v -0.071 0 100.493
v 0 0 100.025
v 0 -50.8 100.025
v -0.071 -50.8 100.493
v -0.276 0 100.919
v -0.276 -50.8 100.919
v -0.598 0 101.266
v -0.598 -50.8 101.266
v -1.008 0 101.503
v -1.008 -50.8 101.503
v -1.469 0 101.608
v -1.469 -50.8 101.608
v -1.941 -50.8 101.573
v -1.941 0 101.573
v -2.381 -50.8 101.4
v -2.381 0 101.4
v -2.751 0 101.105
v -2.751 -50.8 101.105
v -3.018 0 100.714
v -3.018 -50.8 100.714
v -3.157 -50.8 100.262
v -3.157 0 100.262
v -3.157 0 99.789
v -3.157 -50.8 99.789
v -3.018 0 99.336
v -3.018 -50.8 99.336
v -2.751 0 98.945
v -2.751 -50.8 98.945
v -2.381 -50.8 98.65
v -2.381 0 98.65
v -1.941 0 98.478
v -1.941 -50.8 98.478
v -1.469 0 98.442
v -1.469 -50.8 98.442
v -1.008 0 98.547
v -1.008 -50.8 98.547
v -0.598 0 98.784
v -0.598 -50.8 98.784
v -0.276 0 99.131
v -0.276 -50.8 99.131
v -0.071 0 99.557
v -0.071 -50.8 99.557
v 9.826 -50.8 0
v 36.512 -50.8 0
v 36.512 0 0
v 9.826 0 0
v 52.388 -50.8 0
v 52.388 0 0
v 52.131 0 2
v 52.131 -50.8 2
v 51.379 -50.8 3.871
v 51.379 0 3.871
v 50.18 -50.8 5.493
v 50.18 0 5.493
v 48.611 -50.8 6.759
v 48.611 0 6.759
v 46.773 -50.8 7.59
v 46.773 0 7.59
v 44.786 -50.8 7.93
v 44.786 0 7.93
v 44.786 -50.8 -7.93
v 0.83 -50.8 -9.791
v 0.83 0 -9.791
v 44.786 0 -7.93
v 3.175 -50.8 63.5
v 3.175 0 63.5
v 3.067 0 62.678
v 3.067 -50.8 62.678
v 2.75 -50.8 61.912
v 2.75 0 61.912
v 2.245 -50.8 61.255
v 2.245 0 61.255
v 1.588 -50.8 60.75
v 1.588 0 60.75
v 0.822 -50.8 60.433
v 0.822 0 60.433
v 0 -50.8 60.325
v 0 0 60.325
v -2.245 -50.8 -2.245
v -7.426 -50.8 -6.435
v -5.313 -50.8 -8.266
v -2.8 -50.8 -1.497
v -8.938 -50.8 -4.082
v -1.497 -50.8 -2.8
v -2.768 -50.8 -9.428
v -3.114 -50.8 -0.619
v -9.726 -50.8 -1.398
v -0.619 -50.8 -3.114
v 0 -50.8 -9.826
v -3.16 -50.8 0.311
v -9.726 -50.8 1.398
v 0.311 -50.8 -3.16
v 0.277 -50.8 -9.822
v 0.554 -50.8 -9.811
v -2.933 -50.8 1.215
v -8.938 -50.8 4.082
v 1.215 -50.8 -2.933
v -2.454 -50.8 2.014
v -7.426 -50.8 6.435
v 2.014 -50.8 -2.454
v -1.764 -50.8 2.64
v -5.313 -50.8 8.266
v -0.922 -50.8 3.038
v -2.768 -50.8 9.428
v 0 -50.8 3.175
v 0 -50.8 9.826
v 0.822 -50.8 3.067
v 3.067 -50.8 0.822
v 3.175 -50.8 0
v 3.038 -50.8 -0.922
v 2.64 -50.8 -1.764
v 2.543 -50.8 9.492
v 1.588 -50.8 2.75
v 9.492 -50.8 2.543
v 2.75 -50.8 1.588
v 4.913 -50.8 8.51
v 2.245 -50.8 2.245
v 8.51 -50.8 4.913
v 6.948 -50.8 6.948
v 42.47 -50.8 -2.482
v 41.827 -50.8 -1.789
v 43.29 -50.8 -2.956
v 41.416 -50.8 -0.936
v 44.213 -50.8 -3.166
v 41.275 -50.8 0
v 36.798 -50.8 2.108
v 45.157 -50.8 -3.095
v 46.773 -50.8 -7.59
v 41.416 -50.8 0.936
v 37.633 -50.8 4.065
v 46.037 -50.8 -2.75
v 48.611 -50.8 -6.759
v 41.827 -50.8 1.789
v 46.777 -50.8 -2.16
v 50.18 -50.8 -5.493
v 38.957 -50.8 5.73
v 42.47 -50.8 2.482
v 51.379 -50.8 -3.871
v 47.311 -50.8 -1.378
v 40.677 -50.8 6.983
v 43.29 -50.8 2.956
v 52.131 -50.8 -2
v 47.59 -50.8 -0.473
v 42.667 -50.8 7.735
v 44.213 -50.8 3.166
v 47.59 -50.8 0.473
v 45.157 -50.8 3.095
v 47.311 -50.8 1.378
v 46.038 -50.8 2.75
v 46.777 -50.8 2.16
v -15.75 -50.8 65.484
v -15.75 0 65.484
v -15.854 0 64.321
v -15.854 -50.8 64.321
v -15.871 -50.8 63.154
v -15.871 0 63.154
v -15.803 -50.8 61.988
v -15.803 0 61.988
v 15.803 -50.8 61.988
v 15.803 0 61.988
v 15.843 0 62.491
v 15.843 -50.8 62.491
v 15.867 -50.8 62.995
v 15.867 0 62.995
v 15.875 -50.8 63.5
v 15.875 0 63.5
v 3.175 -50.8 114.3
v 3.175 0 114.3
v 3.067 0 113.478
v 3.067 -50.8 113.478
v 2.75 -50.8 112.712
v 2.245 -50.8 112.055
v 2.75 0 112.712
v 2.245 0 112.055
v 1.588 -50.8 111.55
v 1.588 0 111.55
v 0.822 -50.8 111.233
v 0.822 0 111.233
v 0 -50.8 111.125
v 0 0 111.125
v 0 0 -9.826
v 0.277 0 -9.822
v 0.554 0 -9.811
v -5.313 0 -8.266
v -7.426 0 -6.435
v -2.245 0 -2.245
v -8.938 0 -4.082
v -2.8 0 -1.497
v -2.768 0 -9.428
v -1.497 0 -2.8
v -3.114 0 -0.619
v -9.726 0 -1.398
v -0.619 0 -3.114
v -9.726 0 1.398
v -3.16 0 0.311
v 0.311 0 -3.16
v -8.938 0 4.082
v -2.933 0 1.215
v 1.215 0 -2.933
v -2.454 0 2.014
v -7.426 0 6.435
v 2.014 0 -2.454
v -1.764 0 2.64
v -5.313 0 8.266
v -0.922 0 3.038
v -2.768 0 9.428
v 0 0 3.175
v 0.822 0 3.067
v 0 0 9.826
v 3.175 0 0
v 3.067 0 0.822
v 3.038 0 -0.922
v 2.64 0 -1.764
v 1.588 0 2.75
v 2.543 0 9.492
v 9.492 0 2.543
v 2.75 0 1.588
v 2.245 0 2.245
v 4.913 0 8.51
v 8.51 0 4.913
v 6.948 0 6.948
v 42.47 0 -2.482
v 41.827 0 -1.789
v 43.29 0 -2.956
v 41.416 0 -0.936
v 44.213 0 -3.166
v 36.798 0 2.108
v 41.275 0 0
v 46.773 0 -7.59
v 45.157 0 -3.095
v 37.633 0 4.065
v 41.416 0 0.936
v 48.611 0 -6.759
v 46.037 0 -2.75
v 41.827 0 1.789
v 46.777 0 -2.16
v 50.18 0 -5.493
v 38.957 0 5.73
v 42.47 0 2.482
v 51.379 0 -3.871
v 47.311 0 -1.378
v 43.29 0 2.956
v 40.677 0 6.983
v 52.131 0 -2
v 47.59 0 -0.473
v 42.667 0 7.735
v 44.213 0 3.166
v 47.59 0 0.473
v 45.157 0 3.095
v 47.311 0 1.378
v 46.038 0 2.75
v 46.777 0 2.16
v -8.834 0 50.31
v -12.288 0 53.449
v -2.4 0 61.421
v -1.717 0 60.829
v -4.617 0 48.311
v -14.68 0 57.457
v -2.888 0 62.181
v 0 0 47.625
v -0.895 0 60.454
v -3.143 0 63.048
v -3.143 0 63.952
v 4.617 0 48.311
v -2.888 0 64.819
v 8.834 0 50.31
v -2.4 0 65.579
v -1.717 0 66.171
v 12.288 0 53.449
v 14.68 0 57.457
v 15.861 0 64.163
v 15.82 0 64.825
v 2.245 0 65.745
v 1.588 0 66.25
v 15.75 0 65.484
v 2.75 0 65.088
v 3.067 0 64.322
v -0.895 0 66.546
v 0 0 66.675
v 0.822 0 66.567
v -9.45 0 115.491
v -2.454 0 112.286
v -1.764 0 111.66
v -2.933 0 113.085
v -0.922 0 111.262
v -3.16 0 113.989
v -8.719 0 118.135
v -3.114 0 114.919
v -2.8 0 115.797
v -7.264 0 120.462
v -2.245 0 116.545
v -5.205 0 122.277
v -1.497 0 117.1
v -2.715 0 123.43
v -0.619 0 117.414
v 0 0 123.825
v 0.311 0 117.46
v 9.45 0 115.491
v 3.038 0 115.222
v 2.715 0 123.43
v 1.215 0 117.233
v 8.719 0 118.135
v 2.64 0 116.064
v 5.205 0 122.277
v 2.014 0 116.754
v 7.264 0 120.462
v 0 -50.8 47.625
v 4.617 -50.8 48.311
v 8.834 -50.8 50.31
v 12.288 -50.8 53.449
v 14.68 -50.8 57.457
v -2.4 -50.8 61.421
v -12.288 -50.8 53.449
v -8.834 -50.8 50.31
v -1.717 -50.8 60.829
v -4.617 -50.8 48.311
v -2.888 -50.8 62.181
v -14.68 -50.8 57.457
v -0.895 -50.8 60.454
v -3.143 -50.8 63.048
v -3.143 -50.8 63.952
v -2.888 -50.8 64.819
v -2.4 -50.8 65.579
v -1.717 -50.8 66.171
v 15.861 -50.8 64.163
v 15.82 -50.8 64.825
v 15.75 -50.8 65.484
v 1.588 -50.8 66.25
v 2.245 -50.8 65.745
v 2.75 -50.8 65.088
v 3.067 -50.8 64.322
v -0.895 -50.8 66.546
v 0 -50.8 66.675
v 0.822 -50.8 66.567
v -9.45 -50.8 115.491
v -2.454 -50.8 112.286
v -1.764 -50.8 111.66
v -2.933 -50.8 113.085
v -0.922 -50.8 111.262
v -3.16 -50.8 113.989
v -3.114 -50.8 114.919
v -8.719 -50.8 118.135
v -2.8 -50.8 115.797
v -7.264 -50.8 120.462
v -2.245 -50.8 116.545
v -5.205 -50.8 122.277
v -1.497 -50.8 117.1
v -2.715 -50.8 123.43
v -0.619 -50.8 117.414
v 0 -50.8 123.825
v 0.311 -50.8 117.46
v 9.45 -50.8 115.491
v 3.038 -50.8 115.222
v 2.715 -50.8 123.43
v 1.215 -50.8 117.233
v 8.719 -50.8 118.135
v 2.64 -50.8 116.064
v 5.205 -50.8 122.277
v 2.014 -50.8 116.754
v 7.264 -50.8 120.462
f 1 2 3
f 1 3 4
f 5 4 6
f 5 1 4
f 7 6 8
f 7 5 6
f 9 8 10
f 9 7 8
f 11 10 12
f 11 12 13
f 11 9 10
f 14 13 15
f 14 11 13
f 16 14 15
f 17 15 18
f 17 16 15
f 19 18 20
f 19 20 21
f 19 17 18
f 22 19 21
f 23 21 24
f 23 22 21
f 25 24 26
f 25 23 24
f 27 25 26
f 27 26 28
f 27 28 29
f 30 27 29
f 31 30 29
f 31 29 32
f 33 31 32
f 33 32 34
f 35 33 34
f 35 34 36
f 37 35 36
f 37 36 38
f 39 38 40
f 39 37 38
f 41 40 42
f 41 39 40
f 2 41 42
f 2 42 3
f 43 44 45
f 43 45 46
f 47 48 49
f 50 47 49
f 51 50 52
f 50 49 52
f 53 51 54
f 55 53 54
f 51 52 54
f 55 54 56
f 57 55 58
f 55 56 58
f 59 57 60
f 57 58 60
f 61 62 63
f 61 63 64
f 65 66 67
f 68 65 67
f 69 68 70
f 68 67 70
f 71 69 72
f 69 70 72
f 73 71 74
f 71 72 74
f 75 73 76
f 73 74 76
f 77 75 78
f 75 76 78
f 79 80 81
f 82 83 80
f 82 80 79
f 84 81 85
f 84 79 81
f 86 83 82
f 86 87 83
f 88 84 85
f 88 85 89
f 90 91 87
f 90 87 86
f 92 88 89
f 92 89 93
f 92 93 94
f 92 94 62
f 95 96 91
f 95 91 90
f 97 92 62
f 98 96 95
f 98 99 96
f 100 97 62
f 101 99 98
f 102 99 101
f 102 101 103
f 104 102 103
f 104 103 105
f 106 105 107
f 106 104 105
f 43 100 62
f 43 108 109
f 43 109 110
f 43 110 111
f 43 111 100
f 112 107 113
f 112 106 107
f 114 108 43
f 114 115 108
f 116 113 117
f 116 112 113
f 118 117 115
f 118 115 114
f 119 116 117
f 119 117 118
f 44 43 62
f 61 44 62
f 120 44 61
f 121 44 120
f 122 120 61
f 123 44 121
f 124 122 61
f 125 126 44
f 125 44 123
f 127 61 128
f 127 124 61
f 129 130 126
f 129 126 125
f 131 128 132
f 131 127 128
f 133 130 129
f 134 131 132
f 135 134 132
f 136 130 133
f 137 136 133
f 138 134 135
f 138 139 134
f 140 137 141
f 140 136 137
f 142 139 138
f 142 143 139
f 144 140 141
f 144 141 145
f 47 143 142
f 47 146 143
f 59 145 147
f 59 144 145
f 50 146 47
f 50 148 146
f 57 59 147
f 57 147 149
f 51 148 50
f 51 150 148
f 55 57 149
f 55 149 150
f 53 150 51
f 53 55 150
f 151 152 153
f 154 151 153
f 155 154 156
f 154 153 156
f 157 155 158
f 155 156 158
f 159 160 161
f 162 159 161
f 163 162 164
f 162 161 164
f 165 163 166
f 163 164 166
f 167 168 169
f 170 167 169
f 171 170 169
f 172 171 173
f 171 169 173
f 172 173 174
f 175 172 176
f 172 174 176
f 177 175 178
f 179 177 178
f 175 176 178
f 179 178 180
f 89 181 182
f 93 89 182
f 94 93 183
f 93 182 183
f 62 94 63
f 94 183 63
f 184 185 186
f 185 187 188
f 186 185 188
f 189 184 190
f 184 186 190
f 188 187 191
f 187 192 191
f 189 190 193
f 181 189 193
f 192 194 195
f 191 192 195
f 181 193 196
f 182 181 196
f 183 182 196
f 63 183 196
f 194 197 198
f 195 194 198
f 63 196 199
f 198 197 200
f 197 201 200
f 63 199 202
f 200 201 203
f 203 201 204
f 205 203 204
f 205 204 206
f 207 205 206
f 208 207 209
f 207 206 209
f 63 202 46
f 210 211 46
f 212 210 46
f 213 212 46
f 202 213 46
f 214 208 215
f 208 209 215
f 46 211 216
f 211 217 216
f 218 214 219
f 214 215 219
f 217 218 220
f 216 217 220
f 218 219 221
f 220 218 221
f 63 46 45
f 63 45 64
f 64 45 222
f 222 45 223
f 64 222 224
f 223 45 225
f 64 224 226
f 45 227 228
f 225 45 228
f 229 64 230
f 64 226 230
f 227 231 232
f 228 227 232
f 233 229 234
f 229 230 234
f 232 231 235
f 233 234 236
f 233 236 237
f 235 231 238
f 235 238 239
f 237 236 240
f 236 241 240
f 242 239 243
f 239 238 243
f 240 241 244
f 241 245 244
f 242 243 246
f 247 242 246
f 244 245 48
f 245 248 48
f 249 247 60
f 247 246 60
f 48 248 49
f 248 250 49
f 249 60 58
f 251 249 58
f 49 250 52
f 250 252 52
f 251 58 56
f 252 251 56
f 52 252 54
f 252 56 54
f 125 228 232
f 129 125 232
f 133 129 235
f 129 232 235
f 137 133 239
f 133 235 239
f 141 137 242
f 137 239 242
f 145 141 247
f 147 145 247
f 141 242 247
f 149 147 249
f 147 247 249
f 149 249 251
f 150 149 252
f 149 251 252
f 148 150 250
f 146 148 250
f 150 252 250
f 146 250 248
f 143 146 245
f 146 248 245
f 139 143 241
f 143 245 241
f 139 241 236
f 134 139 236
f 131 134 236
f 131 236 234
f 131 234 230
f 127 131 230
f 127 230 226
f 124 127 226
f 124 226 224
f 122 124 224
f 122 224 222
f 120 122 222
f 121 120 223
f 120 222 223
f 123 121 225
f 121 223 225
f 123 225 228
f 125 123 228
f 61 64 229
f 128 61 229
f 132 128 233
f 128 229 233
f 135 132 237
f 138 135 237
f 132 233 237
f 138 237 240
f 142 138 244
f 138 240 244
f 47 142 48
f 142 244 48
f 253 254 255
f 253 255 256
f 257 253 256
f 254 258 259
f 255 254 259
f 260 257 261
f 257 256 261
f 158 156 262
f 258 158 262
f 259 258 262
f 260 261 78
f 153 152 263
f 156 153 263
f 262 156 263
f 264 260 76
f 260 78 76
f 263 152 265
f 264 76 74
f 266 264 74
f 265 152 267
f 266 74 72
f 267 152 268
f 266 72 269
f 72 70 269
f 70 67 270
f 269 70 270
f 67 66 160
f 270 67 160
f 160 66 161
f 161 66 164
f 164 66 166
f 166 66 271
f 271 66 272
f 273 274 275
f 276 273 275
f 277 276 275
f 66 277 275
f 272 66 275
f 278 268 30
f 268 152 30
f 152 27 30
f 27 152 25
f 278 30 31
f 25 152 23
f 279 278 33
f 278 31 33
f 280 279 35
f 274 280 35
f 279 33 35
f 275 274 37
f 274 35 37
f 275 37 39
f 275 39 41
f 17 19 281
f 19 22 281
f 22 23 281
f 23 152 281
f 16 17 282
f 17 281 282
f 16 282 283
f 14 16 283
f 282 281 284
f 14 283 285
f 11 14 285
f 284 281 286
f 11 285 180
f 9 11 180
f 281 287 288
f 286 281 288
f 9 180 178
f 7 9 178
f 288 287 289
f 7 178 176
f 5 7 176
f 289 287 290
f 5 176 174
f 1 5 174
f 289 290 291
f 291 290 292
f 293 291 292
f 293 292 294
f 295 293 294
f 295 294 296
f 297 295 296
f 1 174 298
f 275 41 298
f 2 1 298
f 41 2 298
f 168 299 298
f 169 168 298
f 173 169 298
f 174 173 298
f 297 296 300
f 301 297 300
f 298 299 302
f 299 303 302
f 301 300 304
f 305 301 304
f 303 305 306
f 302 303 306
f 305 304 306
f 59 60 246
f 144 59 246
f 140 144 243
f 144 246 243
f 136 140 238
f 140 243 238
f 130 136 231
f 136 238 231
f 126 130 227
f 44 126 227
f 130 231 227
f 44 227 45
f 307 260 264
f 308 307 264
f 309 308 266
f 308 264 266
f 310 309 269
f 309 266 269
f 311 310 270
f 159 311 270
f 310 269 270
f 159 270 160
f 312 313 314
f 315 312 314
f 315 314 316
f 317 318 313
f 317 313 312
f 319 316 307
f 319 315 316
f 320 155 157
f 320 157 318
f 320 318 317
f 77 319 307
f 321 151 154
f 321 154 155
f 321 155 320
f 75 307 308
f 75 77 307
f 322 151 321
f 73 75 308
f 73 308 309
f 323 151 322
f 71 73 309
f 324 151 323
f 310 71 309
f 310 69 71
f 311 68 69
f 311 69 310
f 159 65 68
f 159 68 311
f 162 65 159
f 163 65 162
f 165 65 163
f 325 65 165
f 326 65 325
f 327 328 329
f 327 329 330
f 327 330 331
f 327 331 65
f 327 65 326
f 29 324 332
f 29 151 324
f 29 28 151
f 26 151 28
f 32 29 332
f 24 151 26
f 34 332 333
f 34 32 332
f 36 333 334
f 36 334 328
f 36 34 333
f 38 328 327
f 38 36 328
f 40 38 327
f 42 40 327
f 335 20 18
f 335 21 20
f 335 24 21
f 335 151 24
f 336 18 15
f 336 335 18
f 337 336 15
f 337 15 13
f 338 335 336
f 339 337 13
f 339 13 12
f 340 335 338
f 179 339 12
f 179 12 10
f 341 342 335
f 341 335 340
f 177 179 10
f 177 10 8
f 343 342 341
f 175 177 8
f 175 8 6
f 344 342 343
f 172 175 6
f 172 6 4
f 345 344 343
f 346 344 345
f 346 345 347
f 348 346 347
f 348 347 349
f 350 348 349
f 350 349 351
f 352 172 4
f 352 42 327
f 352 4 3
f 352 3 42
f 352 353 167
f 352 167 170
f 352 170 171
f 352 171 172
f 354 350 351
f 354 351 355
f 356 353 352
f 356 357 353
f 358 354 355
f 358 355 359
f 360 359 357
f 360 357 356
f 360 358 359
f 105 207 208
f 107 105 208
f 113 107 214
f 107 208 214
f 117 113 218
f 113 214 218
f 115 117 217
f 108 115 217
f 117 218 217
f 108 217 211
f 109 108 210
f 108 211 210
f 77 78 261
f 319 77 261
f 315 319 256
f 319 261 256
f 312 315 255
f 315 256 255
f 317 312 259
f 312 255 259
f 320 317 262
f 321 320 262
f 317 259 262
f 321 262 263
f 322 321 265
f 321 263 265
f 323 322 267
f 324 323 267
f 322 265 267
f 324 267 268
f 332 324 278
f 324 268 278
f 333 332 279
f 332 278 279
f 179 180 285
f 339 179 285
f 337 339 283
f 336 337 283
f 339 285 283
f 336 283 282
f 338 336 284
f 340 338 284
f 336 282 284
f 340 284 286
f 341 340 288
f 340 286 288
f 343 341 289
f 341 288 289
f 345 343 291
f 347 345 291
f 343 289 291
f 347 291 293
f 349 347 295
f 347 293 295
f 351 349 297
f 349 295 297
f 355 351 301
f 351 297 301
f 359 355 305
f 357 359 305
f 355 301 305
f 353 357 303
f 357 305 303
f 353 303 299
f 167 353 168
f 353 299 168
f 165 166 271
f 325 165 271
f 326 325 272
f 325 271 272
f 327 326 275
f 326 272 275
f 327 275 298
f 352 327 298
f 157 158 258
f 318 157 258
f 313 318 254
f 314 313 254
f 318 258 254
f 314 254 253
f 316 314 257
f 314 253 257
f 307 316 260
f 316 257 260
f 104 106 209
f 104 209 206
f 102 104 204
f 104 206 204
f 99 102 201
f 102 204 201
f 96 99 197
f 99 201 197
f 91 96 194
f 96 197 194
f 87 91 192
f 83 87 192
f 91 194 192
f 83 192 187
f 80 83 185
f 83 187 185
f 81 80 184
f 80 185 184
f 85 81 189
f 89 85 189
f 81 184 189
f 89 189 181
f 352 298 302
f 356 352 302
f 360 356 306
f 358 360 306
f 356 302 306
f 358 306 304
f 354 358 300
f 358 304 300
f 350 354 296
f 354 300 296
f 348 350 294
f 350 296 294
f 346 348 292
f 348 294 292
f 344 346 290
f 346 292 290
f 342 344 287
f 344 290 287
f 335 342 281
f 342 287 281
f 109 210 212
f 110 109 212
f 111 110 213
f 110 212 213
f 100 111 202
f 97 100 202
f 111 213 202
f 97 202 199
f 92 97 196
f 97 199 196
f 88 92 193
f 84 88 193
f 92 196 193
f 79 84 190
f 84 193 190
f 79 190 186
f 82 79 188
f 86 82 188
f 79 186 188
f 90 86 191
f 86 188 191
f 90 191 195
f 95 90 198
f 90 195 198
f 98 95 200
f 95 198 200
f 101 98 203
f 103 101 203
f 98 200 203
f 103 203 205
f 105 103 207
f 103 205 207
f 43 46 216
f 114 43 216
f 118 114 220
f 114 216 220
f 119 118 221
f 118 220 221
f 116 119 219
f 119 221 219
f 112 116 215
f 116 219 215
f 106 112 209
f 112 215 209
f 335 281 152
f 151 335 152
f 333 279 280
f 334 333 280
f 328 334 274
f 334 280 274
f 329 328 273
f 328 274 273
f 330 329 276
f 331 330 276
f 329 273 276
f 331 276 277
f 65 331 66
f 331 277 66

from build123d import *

# Parameters (mm, degrees)
F1_DEPTH = 50.8
F0_R     = 1.5875


with BuildPart() as f1:
    # F0 (on Front) → F1 (new body)
    with BuildSketch(Plane.XZ):
        with BuildLine():
            Line((3.175, 0), (9.8263469772, 0))
            ThreePointArc((9.8263469772, 0), (6.9482765818, 6.9482765818), (0, 9.8263469772))
            Line((0, 9.8263469772), (0, 3.175))
            ThreePointArc((0, 3.175), (2.2450640303, 2.2450640303), (3.175, 0))
        make_face()
        with BuildLine():
            Line((36.5125, 0), (9.8263469772, 0))
            ThreePointArc((9.8263469772, 0), (7.2359425088, -6.6481750072), (0.8304849282, -9.7911893915))
            Line((0.8304849282, -9.7911893915), (44.7857238654, -7.930396947))
            ThreePointArc((44.7857238654, -7.930396947), (38.9573185934, -5.7301271553), (36.5125, 0))
        make_face()
        with BuildLine():
            ThreePointArc((0.8304849282, -9.7911893915), (7.2359425088, -6.6481750072), (9.8263469772, 0))
            Line((9.8263469772, 0), (3.175, 0))
            ThreePointArc((3.175, 0), (-2.2450640303, -2.2450640303), (0, 3.175))
            Line((0, 3.175), (0, 9.8263469772))
            ThreePointArc((0, 9.8263469772), (-9.8263469772, 0), (0, -9.8263469772))
            Line((0, -9.8263469772), (0.8304849282, -9.7911893915))
        make_face()
        with BuildLine():
            ThreePointArc((0, -9.8263469772), (0.4156143861, -9.8175536463), (0.8304849282, -9.7911893915))
            Line((0.8304849282, -9.7911893915), (0, -9.8263469772))
        make_face()
        with BuildLine():
            ThreePointArc((44.7857238654, 7.930396947), (38.9573185934, 5.7301271553), (36.5125, 0))
            ThreePointArc((36.5125, 0), (38.9573185934, -5.7301271553), (44.7857238654, -7.930396947))
            ThreePointArc((44.7857238654, -7.930396947), (50.1801271553, -5.4926814066), (52.3875, 0))
            ThreePointArc((52.3875, 0), (50.1801271553, 5.4926814066), (44.7857238654, 7.930396947))
        make_face()
        with BuildLine():
            ThreePointArc((47.625, 0), (44.45, -3.175), (41.275, 0))
            ThreePointArc((41.275, 0), (44.45, 3.175), (47.625, 0))
        make_face(mode=Mode.SUBTRACT)
    extrude(amount=F1_DEPTH)


with BuildPart() as f1b:
    # F0 (on Front) → F1, piece 2 (new body)
    with BuildSketch(Plane.XZ):
        with BuildLine():
            ThreePointArc((-15.8028158025, 61.9878367443), (-10.677313176, 51.7522083632), (0, 47.625))
            Line((0, 47.625), (0, 60.325))
            ThreePointArc((0, 60.325), (-3.175, 63.5), (0, 66.675))
            Line((0, 66.675), (0, 79.375))
            ThreePointArc((0, 79.375), (-10.5003255158, 75.40625), (-15.7504882737, 65.484375))
            ThreePointArc((-15.7504882737, 65.484375), (-15.8732225611, 63.7375511007), (-15.8028158025, 61.9878367443))
        make_face()
        with BuildLine():
            Line((0, 60.325), (0, 47.625))
            ThreePointArc((0, 47.625), (10.677313176, 51.7522083632), (15.8028158025, 61.9878367443))
            ThreePointArc((15.8028158025, 61.9878367443), (15.8569436819, 62.7430574212), (15.875, 63.5))
            ThreePointArc((15.875, 63.5), (15.8438414904, 64.4941387366), (15.7504882737, 65.484375))
            ThreePointArc((15.7504882737, 65.484375), (10.5003255158, 75.40625), (0, 79.375))
            Line((0, 79.375), (0, 66.675))
            ThreePointArc((0, 66.675), (2.2450640303, 65.7450640303), (3.175, 63.5))
            ThreePointArc((3.175, 63.5), (2.2450640303, 61.2549359697), (0, 60.325))
        make_face()
        with BuildLine():
            Line((-9.4502929642, 115.490625), (-15.7504882737, 65.484375))
            ThreePointArc((-15.7504882737, 65.484375), (-10.5003255158, 75.40625), (0, 79.375))
            Line((0, 79.375), (0, 100.0252))
            Line((0, 100.0252), (0, 104.775))
            ThreePointArc((0, 104.775), (-7.14375, 107.9998046905), (-9.4502929642, 115.490625))
        make_face()
        with Locations((-1.5875, 100.0252)):
            Circle(F0_R, mode=Mode.SUBTRACT)
        with BuildLine():
            Line((0, 100.0252), (0, 79.375))
            ThreePointArc((0, 79.375), (10.5003255158, 75.40625), (15.7504882737, 65.484375))
            Line((15.7504882737, 65.484375), (9.4502929642, 115.490625))
            ThreePointArc((9.4502929642, 115.490625), (9.5063048942, 114.896483242), (9.525, 114.3))
            ThreePointArc((9.525, 114.3), (6.7351920908, 107.5648079092), (0, 104.775))
            Line((0, 104.775), (0, 100.0252))
        make_face()
        with BuildLine():
            ThreePointArc((9.4502929642, 115.490625), (0, 123.825), (-9.4502929642, 115.490625))
            ThreePointArc((-9.4502929642, 115.490625), (-7.14375, 107.9998046905), (0, 104.775))
            ThreePointArc((0, 104.775), (6.7351920908, 107.5648079092), (9.525, 114.3))
            ThreePointArc((9.525, 114.3), (9.5063048942, 114.896483242), (9.4502929642, 115.490625))
        make_face()
        with BuildLine():
            ThreePointArc((3.175, 114.3), (2.2450640303, 112.0549359697), (0, 111.125))
            ThreePointArc((0, 111.125), (-2.2450640303, 116.5450640303), (3.175, 114.3))
        make_face(mode=Mode.SUBTRACT)
    extrude(amount=F1_DEPTH)


solid = Compound([f1.part, f1b.part])
